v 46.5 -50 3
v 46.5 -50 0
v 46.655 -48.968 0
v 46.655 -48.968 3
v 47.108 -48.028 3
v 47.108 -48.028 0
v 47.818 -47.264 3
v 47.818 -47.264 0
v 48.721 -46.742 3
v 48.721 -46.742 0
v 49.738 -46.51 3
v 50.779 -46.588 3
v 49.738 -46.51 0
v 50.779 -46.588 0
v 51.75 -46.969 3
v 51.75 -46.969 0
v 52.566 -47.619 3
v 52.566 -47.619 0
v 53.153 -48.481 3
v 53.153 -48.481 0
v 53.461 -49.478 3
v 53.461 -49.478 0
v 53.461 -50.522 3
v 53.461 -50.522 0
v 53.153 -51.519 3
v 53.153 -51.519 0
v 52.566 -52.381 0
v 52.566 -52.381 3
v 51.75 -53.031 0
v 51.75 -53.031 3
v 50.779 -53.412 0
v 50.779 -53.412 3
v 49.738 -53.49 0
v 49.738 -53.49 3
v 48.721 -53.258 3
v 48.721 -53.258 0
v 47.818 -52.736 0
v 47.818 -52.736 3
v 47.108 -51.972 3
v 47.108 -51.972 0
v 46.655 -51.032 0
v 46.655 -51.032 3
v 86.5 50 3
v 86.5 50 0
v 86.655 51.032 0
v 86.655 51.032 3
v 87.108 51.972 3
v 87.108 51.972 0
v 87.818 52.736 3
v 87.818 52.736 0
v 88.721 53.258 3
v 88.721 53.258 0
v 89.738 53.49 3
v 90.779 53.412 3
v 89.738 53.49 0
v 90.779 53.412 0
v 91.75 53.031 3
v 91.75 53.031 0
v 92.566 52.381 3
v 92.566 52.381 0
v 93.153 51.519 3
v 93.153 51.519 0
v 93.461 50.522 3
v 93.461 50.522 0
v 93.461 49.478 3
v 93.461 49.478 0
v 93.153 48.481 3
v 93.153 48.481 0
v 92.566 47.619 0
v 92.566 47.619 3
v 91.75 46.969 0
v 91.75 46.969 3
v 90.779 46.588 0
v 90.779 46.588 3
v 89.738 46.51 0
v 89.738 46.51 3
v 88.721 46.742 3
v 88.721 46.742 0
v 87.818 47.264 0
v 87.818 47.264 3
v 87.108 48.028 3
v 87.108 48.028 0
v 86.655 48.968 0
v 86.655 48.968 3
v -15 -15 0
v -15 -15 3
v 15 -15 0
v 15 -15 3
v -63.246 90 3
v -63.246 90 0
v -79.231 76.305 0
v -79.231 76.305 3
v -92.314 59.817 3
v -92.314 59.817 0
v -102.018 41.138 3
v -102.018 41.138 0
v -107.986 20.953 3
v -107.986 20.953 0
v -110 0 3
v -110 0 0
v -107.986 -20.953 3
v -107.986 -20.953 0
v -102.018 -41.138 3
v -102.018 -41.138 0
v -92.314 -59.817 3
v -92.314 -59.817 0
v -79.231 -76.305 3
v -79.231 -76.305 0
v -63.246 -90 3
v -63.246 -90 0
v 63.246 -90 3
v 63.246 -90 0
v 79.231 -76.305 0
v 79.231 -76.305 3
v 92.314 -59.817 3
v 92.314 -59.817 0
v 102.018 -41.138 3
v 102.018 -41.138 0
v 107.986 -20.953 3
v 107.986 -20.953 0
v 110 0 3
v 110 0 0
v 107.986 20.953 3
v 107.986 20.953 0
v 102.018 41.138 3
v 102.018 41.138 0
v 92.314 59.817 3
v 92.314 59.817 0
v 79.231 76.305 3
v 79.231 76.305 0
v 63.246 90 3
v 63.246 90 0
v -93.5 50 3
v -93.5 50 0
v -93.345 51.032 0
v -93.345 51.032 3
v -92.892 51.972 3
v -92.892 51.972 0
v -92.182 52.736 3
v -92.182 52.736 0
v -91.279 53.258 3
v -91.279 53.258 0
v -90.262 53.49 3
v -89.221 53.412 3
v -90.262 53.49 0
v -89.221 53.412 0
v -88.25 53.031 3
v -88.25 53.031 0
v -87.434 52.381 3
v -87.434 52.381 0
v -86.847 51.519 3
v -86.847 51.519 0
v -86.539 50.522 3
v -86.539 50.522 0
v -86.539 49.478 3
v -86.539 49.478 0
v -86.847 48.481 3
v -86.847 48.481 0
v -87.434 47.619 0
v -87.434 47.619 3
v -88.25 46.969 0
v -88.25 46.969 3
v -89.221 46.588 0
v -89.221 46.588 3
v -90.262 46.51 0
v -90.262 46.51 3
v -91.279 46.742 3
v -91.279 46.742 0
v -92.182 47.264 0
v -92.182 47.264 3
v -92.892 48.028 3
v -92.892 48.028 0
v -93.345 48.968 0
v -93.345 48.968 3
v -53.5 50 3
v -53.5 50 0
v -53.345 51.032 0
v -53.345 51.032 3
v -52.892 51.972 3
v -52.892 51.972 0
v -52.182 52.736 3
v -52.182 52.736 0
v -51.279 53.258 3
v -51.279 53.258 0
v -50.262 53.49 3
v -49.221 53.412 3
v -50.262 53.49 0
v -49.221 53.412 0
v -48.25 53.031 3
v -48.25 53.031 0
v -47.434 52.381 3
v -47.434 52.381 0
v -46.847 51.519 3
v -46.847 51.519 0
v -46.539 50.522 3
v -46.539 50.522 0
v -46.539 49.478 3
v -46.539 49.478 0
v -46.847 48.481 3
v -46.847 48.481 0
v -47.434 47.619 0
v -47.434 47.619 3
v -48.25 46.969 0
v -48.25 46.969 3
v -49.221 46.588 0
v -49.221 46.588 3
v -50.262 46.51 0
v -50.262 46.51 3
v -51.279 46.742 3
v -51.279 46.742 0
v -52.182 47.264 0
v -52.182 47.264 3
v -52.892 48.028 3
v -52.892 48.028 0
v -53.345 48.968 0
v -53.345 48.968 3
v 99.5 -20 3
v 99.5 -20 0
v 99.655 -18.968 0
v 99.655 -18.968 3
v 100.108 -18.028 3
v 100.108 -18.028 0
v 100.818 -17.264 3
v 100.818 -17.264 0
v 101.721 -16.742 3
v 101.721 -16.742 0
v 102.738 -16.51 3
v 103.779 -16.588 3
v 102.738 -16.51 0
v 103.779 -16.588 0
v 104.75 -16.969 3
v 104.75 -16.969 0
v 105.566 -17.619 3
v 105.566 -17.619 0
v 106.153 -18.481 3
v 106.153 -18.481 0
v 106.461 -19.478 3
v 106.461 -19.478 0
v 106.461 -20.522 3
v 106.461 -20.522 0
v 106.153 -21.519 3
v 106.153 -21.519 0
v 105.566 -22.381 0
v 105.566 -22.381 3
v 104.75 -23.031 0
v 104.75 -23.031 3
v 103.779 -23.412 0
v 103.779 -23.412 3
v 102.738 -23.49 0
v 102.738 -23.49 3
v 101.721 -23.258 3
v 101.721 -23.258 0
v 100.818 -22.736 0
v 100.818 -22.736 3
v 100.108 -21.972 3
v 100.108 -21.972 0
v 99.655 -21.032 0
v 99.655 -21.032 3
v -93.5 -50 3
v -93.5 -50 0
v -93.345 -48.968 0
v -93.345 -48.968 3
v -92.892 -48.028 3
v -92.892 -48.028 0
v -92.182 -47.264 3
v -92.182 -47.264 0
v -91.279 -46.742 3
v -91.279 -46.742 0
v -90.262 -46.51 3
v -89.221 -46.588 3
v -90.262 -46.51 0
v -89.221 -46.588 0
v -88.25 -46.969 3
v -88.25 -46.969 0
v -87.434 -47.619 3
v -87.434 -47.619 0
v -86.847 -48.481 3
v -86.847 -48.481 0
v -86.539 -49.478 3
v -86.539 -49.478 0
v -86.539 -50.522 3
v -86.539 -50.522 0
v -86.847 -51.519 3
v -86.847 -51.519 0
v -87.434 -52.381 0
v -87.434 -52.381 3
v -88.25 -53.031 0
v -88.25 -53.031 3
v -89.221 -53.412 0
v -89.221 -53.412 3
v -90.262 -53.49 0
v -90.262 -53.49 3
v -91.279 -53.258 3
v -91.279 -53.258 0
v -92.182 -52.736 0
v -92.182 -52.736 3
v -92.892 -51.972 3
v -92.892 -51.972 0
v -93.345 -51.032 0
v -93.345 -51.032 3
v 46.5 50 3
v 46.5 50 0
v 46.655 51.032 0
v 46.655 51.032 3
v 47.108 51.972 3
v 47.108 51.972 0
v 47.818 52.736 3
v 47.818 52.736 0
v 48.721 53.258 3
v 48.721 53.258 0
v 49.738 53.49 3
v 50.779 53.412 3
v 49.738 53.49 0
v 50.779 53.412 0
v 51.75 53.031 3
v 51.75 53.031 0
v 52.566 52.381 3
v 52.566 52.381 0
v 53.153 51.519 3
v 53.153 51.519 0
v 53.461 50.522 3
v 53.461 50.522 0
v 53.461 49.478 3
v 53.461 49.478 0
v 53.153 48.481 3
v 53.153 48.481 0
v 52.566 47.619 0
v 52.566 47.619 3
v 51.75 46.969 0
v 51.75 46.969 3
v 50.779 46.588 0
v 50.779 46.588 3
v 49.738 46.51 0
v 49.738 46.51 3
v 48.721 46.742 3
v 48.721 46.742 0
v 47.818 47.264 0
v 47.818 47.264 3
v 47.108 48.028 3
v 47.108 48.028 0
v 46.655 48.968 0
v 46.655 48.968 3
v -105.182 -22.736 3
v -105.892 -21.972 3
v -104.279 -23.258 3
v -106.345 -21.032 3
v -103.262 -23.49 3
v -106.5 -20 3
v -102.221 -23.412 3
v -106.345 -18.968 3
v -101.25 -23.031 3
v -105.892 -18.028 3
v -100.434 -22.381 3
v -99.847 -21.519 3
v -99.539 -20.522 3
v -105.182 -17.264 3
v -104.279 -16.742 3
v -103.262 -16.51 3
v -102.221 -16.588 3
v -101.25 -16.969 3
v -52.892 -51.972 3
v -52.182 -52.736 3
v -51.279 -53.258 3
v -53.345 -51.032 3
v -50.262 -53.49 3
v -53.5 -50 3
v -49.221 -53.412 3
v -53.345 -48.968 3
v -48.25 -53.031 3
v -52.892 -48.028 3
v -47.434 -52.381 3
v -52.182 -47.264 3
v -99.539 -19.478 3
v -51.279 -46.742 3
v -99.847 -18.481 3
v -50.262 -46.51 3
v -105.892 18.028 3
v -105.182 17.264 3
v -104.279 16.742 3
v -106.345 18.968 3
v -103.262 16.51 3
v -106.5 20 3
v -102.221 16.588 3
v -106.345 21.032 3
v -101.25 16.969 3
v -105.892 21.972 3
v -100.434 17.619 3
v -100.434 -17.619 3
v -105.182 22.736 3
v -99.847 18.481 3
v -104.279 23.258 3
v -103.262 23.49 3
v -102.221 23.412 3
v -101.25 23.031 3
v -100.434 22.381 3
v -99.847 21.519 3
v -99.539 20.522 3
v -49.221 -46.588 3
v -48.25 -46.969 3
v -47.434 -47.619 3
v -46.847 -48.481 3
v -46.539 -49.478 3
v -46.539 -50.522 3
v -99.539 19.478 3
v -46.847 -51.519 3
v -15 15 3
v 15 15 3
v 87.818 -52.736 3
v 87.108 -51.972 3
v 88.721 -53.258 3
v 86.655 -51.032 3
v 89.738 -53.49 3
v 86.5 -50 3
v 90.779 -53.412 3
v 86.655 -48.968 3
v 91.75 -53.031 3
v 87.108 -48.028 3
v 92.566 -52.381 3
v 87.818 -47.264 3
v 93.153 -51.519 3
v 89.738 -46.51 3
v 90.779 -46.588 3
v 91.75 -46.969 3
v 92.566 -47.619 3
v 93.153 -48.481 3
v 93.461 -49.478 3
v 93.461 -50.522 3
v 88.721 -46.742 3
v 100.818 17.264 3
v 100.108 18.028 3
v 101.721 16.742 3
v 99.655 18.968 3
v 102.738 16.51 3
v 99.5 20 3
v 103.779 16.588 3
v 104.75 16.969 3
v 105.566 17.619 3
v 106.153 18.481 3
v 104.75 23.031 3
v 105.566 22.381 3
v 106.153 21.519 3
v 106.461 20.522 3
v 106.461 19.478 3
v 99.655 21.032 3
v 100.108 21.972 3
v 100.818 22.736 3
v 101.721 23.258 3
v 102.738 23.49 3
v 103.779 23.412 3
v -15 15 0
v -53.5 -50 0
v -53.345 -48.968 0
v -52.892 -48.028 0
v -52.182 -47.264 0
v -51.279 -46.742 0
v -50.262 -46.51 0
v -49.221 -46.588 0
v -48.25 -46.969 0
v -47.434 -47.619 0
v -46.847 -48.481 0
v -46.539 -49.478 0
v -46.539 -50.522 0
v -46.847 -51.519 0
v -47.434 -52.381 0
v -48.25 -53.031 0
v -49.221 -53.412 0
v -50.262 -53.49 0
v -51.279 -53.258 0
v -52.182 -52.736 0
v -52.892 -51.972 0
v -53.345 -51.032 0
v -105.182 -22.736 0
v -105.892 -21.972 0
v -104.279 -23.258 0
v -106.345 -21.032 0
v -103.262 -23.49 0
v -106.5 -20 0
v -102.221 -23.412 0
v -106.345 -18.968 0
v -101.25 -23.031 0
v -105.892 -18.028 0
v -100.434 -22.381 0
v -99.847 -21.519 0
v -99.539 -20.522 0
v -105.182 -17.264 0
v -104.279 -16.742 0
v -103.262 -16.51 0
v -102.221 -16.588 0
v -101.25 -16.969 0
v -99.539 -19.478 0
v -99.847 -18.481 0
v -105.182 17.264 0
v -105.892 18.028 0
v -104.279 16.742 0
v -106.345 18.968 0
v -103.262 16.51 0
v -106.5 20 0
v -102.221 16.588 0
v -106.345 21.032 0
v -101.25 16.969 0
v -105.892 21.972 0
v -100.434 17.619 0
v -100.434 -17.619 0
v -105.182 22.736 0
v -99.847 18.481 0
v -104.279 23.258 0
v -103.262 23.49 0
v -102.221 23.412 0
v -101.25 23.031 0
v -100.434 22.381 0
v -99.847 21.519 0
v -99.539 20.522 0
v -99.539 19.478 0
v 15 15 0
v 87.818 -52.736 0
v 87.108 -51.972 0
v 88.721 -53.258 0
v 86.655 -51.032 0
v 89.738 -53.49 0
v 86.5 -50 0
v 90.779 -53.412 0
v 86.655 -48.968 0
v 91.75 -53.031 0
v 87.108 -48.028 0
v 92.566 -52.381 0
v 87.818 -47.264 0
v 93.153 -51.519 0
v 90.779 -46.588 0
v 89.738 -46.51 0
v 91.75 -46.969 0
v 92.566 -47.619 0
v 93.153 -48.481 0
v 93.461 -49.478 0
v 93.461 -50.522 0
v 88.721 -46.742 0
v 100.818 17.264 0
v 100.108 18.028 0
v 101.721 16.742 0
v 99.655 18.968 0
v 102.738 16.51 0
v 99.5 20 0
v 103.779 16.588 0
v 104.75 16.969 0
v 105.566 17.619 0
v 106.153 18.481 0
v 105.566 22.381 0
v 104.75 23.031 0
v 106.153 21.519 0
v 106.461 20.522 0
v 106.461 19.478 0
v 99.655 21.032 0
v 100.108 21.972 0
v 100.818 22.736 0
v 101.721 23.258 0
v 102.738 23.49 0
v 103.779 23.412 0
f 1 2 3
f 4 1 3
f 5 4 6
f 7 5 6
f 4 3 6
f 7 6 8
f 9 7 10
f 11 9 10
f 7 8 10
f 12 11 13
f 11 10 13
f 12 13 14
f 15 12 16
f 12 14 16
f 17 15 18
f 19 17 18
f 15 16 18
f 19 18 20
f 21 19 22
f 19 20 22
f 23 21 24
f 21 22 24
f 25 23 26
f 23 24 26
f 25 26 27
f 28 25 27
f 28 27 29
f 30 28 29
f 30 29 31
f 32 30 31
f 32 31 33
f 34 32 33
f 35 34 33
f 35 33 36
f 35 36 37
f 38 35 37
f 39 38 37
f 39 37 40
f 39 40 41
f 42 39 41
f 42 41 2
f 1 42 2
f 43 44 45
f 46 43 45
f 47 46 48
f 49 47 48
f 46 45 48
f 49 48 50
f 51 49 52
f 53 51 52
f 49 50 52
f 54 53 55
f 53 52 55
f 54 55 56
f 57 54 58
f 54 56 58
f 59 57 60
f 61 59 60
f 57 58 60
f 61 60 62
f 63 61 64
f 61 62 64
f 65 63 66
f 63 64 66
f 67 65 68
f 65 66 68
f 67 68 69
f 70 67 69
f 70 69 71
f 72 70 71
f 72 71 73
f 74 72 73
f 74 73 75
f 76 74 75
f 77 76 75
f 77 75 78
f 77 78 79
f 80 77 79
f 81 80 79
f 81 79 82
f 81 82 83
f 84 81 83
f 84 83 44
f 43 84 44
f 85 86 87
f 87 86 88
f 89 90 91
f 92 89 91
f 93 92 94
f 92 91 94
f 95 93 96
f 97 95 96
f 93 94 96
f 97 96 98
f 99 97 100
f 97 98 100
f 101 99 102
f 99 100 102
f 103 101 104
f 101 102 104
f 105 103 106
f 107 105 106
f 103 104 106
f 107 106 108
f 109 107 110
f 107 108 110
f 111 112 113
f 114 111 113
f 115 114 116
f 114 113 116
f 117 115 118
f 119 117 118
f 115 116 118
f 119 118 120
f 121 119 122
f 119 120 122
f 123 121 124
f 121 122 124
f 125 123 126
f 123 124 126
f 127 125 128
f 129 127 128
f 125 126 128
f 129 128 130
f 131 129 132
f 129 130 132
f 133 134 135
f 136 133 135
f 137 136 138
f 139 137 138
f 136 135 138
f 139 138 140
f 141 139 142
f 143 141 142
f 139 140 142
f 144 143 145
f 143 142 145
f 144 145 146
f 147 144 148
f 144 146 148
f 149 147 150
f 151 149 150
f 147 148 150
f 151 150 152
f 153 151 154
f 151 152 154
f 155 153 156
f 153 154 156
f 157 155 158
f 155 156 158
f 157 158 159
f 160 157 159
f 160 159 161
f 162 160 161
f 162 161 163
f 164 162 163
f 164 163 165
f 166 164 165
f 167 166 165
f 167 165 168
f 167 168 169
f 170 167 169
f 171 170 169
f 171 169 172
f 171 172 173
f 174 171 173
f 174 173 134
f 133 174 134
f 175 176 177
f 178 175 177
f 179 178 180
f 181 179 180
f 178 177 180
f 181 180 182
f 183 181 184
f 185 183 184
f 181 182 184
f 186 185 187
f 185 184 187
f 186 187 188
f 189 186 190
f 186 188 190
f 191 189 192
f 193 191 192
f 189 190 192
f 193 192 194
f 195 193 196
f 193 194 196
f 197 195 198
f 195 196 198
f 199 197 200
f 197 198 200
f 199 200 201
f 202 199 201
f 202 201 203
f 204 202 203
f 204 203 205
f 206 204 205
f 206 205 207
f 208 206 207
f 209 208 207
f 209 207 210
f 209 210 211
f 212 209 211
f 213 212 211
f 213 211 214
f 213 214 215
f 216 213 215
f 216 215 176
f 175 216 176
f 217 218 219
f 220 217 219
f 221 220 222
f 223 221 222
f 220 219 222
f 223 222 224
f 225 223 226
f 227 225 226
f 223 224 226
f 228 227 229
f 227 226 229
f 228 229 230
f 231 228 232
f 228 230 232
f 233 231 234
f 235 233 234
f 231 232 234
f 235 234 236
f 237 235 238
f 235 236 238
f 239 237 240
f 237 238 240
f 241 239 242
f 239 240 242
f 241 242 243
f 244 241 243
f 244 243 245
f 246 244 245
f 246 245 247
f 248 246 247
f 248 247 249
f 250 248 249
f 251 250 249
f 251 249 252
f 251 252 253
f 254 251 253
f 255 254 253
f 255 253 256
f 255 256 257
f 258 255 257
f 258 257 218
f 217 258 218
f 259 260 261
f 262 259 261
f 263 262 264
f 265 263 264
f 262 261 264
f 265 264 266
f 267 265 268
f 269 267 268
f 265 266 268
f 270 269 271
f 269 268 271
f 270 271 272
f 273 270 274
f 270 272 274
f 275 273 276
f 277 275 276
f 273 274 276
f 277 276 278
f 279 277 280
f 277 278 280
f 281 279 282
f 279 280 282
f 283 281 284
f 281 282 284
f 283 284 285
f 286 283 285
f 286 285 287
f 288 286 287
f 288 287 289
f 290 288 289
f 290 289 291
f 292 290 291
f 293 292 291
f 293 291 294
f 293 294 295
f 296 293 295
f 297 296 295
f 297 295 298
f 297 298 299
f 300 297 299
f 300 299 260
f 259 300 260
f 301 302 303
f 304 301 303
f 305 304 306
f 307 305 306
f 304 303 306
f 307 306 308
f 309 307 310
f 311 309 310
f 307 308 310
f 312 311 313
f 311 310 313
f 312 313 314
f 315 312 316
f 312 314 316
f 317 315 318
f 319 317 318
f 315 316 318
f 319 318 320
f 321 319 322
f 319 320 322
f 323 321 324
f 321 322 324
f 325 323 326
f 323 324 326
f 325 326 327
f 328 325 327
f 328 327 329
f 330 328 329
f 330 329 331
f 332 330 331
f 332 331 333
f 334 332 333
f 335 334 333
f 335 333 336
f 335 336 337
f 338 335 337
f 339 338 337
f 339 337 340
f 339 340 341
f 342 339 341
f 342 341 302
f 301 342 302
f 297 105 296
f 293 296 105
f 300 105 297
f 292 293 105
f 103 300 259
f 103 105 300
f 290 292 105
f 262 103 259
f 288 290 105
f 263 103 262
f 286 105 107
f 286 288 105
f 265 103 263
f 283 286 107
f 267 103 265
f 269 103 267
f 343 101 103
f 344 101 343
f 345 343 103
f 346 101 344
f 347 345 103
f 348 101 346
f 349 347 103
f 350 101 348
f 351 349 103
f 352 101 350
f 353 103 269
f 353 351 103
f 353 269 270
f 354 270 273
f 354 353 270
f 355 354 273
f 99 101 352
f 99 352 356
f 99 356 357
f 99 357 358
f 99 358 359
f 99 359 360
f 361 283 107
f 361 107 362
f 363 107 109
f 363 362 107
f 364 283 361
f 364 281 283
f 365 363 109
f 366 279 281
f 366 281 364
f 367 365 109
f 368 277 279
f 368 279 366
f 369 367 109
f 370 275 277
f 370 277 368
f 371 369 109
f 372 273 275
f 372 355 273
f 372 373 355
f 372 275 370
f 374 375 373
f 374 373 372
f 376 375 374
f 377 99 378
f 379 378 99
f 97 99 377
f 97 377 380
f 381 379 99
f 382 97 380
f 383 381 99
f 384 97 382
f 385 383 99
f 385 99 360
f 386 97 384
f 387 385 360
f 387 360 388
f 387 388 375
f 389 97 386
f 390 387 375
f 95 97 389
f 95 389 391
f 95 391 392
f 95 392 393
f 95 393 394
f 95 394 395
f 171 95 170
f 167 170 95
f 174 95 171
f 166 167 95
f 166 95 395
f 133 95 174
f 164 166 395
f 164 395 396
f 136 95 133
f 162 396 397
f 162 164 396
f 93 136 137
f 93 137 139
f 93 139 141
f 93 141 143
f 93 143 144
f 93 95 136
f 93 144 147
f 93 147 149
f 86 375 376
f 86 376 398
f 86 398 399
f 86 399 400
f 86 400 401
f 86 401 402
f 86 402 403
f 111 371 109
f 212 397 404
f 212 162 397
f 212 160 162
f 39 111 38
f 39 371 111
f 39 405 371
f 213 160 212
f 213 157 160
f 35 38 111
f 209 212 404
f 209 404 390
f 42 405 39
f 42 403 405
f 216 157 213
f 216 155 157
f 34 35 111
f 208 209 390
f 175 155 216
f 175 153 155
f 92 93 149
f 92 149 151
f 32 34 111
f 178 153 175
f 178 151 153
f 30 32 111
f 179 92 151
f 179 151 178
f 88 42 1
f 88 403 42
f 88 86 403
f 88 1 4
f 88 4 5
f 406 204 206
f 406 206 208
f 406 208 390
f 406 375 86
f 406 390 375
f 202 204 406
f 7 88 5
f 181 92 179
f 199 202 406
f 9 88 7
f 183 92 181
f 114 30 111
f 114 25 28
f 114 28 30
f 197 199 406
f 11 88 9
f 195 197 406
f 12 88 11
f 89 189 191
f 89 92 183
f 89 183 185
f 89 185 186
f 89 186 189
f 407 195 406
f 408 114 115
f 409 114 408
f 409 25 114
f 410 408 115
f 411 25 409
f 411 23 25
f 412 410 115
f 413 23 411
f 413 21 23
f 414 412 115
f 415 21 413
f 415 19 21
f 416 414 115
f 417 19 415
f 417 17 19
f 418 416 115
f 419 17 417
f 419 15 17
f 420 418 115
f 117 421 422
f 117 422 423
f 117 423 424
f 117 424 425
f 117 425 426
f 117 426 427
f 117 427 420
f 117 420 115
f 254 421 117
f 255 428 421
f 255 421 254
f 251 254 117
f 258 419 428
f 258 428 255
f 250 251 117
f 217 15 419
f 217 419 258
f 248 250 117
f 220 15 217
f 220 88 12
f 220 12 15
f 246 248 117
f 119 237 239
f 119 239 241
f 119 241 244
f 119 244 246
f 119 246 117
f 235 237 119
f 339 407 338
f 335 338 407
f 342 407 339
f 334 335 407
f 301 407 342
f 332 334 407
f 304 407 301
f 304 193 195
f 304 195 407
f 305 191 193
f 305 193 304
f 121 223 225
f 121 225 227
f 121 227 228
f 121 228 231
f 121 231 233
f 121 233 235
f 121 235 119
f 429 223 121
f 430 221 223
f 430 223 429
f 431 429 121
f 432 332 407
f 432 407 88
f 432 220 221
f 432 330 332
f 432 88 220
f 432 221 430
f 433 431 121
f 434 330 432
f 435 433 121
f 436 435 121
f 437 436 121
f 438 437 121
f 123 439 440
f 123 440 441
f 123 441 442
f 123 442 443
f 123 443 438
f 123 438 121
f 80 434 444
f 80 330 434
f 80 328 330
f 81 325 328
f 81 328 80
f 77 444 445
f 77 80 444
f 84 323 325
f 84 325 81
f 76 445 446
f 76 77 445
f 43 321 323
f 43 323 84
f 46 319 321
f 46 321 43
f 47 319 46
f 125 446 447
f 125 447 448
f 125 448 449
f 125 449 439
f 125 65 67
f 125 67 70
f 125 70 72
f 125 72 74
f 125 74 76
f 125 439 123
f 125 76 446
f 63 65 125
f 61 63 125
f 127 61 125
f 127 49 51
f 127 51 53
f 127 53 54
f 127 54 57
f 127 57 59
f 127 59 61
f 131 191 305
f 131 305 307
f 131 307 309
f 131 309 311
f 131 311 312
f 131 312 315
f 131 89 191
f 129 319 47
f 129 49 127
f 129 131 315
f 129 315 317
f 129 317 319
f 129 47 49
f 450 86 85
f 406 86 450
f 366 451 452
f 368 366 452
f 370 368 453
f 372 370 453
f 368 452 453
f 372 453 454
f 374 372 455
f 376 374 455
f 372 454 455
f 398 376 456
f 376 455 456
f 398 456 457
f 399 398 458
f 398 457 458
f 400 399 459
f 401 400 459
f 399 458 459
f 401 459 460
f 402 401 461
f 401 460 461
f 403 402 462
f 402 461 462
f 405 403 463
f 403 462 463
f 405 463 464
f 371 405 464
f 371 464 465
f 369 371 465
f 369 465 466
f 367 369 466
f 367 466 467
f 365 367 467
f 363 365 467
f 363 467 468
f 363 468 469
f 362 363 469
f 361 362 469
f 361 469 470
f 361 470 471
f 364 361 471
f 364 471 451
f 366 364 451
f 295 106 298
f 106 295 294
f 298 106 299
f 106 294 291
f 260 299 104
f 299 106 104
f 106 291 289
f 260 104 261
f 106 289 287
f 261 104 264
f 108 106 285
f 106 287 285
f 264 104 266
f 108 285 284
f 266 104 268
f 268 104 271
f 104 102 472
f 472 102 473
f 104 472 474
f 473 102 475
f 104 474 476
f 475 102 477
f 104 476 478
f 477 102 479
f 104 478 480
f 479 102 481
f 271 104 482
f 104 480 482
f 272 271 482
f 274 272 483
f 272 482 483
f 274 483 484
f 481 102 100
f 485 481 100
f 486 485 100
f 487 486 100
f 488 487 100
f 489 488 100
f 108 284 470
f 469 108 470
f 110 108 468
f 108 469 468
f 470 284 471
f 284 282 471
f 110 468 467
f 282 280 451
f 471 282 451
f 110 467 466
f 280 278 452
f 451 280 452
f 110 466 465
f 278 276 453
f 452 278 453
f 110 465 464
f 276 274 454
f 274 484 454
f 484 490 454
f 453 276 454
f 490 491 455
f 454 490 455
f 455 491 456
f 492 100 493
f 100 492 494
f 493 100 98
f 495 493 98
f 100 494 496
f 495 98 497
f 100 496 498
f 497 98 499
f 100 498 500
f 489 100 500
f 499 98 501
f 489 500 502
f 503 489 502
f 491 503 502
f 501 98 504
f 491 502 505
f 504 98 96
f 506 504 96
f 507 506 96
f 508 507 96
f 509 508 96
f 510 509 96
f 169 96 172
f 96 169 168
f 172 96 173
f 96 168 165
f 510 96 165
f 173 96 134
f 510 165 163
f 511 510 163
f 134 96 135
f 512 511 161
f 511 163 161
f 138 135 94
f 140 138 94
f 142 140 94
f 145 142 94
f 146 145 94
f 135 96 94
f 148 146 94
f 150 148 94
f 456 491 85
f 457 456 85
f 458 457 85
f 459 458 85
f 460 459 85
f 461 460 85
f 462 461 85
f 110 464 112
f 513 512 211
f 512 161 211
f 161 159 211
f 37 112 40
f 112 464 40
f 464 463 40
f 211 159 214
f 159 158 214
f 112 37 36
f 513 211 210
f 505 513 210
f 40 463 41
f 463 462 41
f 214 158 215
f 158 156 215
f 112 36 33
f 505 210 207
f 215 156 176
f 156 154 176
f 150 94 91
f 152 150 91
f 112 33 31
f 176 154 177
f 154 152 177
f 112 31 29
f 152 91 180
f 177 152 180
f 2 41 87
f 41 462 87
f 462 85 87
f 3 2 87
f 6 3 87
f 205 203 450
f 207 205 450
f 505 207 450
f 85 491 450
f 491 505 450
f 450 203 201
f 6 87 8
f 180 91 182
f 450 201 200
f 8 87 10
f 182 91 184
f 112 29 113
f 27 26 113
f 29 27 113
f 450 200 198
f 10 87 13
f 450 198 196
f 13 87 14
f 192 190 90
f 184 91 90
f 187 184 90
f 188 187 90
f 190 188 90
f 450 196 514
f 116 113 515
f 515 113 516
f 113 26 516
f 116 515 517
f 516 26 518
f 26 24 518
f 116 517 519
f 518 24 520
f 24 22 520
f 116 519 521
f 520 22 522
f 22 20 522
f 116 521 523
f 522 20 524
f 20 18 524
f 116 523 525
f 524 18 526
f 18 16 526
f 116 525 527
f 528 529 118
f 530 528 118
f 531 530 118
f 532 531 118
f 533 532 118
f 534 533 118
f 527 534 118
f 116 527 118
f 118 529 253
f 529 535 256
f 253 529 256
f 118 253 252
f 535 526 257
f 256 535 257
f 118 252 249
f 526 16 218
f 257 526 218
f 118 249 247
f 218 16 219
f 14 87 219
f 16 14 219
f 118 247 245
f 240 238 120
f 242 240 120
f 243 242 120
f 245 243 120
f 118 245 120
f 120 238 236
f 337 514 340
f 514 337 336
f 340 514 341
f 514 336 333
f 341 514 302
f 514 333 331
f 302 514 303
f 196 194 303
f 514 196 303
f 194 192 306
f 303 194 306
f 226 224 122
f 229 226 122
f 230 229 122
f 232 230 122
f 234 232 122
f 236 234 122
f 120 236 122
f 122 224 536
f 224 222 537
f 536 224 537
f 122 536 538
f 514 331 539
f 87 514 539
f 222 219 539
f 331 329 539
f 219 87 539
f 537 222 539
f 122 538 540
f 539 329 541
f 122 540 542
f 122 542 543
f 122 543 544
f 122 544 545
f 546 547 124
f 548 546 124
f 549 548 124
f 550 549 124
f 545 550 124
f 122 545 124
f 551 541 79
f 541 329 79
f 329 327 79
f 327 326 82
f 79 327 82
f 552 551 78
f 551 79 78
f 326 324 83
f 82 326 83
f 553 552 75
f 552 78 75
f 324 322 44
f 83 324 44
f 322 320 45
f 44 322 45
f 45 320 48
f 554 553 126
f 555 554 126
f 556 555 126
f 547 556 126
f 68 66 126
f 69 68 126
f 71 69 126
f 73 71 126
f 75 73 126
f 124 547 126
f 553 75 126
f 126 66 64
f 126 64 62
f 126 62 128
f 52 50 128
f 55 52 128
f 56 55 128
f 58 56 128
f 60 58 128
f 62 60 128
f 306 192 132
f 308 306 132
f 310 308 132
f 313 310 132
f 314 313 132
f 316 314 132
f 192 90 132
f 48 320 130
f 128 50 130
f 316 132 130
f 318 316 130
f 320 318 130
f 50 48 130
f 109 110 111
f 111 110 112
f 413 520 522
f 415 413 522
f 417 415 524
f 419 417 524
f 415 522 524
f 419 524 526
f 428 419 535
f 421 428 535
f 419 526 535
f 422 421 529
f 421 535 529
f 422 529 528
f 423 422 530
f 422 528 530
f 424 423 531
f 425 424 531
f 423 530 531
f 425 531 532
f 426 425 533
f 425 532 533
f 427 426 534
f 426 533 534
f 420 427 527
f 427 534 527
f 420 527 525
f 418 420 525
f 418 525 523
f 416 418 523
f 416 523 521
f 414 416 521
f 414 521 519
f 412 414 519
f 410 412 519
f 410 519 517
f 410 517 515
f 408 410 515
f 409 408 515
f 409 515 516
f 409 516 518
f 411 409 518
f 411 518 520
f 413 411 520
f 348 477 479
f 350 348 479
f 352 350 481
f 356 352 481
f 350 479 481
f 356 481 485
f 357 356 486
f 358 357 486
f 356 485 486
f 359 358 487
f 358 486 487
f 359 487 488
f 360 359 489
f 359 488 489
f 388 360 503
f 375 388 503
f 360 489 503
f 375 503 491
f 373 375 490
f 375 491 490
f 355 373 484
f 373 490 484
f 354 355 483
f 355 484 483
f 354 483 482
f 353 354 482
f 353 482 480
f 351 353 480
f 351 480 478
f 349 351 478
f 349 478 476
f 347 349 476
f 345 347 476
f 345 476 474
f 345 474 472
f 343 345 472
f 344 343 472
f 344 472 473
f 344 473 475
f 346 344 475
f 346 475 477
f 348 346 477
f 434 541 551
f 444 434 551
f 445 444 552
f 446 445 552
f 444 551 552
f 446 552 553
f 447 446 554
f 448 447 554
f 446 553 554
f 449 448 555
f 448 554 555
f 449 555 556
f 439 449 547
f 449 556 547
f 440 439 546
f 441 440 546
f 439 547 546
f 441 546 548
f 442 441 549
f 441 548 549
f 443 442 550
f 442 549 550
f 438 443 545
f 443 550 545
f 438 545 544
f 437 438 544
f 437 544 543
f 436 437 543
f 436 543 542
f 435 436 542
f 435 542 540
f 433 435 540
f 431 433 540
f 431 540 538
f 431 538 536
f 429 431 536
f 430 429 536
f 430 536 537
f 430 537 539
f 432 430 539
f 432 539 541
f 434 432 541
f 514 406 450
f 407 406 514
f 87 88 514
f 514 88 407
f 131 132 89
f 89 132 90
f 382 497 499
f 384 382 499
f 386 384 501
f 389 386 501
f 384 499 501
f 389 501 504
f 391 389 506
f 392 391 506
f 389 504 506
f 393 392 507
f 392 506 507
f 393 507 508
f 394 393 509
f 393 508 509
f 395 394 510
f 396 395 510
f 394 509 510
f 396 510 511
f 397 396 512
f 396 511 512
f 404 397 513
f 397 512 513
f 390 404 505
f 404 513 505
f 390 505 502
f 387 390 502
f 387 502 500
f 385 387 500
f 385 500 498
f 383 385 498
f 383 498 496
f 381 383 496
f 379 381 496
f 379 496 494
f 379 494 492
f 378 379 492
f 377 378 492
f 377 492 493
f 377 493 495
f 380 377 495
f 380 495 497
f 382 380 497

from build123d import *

# Parameters (mm, degrees)
F1_DEPTH = 3
F3_D     = 7
F5_D     = 7
F6_W     = 30
F6_H     = 30
F7_DEPTH = 3.001


# Not quite as in the source:
# - a feature names something its author has since deleted; it is built from what else it names


with BuildPart() as f1:
    # F0 (on Top) → F1 (new body)
    with BuildSketch(Plane.XY):
        with BuildLine():
            Line((63.2455532034, 90), (-63.2455532034, 90))
            ThreePointArc((-63.2455532034, 90), (-110, 0), (-63.2455532034, -90))
            Line((-63.2455532034, -90), (63.2455532034, -90))
            ThreePointArc((63.2455532034, -90), (110, 0), (63.2455532034, 90))
        make_face()
    extrude(amount=F1_DEPTH)

    # F3 (through all)
    with Locations(Plane.XY.offset(3)):
        with Locations((-103, 20), (-103, -20), (-90, 50), (-90, -50), (90, -50), (90, 50), (103, 20), (103, -20)):
            Hole(F3_D / 2)

    # F5 (through all)
    with Locations(Plane.XY.offset(3)):
        with Locations((-50, 50), (50, 50), (50, -50), (-50, -50)):
            Hole(F5_D / 2)

    # F6 (on face) → F7 (cut, through all)
    with BuildSketch(Plane.XY.offset(3)):
        Rectangle(F6_W, F6_H)
    extrude(amount=-F7_DEPTH, mode=Mode.SUBTRACT)


solid = f1.part
